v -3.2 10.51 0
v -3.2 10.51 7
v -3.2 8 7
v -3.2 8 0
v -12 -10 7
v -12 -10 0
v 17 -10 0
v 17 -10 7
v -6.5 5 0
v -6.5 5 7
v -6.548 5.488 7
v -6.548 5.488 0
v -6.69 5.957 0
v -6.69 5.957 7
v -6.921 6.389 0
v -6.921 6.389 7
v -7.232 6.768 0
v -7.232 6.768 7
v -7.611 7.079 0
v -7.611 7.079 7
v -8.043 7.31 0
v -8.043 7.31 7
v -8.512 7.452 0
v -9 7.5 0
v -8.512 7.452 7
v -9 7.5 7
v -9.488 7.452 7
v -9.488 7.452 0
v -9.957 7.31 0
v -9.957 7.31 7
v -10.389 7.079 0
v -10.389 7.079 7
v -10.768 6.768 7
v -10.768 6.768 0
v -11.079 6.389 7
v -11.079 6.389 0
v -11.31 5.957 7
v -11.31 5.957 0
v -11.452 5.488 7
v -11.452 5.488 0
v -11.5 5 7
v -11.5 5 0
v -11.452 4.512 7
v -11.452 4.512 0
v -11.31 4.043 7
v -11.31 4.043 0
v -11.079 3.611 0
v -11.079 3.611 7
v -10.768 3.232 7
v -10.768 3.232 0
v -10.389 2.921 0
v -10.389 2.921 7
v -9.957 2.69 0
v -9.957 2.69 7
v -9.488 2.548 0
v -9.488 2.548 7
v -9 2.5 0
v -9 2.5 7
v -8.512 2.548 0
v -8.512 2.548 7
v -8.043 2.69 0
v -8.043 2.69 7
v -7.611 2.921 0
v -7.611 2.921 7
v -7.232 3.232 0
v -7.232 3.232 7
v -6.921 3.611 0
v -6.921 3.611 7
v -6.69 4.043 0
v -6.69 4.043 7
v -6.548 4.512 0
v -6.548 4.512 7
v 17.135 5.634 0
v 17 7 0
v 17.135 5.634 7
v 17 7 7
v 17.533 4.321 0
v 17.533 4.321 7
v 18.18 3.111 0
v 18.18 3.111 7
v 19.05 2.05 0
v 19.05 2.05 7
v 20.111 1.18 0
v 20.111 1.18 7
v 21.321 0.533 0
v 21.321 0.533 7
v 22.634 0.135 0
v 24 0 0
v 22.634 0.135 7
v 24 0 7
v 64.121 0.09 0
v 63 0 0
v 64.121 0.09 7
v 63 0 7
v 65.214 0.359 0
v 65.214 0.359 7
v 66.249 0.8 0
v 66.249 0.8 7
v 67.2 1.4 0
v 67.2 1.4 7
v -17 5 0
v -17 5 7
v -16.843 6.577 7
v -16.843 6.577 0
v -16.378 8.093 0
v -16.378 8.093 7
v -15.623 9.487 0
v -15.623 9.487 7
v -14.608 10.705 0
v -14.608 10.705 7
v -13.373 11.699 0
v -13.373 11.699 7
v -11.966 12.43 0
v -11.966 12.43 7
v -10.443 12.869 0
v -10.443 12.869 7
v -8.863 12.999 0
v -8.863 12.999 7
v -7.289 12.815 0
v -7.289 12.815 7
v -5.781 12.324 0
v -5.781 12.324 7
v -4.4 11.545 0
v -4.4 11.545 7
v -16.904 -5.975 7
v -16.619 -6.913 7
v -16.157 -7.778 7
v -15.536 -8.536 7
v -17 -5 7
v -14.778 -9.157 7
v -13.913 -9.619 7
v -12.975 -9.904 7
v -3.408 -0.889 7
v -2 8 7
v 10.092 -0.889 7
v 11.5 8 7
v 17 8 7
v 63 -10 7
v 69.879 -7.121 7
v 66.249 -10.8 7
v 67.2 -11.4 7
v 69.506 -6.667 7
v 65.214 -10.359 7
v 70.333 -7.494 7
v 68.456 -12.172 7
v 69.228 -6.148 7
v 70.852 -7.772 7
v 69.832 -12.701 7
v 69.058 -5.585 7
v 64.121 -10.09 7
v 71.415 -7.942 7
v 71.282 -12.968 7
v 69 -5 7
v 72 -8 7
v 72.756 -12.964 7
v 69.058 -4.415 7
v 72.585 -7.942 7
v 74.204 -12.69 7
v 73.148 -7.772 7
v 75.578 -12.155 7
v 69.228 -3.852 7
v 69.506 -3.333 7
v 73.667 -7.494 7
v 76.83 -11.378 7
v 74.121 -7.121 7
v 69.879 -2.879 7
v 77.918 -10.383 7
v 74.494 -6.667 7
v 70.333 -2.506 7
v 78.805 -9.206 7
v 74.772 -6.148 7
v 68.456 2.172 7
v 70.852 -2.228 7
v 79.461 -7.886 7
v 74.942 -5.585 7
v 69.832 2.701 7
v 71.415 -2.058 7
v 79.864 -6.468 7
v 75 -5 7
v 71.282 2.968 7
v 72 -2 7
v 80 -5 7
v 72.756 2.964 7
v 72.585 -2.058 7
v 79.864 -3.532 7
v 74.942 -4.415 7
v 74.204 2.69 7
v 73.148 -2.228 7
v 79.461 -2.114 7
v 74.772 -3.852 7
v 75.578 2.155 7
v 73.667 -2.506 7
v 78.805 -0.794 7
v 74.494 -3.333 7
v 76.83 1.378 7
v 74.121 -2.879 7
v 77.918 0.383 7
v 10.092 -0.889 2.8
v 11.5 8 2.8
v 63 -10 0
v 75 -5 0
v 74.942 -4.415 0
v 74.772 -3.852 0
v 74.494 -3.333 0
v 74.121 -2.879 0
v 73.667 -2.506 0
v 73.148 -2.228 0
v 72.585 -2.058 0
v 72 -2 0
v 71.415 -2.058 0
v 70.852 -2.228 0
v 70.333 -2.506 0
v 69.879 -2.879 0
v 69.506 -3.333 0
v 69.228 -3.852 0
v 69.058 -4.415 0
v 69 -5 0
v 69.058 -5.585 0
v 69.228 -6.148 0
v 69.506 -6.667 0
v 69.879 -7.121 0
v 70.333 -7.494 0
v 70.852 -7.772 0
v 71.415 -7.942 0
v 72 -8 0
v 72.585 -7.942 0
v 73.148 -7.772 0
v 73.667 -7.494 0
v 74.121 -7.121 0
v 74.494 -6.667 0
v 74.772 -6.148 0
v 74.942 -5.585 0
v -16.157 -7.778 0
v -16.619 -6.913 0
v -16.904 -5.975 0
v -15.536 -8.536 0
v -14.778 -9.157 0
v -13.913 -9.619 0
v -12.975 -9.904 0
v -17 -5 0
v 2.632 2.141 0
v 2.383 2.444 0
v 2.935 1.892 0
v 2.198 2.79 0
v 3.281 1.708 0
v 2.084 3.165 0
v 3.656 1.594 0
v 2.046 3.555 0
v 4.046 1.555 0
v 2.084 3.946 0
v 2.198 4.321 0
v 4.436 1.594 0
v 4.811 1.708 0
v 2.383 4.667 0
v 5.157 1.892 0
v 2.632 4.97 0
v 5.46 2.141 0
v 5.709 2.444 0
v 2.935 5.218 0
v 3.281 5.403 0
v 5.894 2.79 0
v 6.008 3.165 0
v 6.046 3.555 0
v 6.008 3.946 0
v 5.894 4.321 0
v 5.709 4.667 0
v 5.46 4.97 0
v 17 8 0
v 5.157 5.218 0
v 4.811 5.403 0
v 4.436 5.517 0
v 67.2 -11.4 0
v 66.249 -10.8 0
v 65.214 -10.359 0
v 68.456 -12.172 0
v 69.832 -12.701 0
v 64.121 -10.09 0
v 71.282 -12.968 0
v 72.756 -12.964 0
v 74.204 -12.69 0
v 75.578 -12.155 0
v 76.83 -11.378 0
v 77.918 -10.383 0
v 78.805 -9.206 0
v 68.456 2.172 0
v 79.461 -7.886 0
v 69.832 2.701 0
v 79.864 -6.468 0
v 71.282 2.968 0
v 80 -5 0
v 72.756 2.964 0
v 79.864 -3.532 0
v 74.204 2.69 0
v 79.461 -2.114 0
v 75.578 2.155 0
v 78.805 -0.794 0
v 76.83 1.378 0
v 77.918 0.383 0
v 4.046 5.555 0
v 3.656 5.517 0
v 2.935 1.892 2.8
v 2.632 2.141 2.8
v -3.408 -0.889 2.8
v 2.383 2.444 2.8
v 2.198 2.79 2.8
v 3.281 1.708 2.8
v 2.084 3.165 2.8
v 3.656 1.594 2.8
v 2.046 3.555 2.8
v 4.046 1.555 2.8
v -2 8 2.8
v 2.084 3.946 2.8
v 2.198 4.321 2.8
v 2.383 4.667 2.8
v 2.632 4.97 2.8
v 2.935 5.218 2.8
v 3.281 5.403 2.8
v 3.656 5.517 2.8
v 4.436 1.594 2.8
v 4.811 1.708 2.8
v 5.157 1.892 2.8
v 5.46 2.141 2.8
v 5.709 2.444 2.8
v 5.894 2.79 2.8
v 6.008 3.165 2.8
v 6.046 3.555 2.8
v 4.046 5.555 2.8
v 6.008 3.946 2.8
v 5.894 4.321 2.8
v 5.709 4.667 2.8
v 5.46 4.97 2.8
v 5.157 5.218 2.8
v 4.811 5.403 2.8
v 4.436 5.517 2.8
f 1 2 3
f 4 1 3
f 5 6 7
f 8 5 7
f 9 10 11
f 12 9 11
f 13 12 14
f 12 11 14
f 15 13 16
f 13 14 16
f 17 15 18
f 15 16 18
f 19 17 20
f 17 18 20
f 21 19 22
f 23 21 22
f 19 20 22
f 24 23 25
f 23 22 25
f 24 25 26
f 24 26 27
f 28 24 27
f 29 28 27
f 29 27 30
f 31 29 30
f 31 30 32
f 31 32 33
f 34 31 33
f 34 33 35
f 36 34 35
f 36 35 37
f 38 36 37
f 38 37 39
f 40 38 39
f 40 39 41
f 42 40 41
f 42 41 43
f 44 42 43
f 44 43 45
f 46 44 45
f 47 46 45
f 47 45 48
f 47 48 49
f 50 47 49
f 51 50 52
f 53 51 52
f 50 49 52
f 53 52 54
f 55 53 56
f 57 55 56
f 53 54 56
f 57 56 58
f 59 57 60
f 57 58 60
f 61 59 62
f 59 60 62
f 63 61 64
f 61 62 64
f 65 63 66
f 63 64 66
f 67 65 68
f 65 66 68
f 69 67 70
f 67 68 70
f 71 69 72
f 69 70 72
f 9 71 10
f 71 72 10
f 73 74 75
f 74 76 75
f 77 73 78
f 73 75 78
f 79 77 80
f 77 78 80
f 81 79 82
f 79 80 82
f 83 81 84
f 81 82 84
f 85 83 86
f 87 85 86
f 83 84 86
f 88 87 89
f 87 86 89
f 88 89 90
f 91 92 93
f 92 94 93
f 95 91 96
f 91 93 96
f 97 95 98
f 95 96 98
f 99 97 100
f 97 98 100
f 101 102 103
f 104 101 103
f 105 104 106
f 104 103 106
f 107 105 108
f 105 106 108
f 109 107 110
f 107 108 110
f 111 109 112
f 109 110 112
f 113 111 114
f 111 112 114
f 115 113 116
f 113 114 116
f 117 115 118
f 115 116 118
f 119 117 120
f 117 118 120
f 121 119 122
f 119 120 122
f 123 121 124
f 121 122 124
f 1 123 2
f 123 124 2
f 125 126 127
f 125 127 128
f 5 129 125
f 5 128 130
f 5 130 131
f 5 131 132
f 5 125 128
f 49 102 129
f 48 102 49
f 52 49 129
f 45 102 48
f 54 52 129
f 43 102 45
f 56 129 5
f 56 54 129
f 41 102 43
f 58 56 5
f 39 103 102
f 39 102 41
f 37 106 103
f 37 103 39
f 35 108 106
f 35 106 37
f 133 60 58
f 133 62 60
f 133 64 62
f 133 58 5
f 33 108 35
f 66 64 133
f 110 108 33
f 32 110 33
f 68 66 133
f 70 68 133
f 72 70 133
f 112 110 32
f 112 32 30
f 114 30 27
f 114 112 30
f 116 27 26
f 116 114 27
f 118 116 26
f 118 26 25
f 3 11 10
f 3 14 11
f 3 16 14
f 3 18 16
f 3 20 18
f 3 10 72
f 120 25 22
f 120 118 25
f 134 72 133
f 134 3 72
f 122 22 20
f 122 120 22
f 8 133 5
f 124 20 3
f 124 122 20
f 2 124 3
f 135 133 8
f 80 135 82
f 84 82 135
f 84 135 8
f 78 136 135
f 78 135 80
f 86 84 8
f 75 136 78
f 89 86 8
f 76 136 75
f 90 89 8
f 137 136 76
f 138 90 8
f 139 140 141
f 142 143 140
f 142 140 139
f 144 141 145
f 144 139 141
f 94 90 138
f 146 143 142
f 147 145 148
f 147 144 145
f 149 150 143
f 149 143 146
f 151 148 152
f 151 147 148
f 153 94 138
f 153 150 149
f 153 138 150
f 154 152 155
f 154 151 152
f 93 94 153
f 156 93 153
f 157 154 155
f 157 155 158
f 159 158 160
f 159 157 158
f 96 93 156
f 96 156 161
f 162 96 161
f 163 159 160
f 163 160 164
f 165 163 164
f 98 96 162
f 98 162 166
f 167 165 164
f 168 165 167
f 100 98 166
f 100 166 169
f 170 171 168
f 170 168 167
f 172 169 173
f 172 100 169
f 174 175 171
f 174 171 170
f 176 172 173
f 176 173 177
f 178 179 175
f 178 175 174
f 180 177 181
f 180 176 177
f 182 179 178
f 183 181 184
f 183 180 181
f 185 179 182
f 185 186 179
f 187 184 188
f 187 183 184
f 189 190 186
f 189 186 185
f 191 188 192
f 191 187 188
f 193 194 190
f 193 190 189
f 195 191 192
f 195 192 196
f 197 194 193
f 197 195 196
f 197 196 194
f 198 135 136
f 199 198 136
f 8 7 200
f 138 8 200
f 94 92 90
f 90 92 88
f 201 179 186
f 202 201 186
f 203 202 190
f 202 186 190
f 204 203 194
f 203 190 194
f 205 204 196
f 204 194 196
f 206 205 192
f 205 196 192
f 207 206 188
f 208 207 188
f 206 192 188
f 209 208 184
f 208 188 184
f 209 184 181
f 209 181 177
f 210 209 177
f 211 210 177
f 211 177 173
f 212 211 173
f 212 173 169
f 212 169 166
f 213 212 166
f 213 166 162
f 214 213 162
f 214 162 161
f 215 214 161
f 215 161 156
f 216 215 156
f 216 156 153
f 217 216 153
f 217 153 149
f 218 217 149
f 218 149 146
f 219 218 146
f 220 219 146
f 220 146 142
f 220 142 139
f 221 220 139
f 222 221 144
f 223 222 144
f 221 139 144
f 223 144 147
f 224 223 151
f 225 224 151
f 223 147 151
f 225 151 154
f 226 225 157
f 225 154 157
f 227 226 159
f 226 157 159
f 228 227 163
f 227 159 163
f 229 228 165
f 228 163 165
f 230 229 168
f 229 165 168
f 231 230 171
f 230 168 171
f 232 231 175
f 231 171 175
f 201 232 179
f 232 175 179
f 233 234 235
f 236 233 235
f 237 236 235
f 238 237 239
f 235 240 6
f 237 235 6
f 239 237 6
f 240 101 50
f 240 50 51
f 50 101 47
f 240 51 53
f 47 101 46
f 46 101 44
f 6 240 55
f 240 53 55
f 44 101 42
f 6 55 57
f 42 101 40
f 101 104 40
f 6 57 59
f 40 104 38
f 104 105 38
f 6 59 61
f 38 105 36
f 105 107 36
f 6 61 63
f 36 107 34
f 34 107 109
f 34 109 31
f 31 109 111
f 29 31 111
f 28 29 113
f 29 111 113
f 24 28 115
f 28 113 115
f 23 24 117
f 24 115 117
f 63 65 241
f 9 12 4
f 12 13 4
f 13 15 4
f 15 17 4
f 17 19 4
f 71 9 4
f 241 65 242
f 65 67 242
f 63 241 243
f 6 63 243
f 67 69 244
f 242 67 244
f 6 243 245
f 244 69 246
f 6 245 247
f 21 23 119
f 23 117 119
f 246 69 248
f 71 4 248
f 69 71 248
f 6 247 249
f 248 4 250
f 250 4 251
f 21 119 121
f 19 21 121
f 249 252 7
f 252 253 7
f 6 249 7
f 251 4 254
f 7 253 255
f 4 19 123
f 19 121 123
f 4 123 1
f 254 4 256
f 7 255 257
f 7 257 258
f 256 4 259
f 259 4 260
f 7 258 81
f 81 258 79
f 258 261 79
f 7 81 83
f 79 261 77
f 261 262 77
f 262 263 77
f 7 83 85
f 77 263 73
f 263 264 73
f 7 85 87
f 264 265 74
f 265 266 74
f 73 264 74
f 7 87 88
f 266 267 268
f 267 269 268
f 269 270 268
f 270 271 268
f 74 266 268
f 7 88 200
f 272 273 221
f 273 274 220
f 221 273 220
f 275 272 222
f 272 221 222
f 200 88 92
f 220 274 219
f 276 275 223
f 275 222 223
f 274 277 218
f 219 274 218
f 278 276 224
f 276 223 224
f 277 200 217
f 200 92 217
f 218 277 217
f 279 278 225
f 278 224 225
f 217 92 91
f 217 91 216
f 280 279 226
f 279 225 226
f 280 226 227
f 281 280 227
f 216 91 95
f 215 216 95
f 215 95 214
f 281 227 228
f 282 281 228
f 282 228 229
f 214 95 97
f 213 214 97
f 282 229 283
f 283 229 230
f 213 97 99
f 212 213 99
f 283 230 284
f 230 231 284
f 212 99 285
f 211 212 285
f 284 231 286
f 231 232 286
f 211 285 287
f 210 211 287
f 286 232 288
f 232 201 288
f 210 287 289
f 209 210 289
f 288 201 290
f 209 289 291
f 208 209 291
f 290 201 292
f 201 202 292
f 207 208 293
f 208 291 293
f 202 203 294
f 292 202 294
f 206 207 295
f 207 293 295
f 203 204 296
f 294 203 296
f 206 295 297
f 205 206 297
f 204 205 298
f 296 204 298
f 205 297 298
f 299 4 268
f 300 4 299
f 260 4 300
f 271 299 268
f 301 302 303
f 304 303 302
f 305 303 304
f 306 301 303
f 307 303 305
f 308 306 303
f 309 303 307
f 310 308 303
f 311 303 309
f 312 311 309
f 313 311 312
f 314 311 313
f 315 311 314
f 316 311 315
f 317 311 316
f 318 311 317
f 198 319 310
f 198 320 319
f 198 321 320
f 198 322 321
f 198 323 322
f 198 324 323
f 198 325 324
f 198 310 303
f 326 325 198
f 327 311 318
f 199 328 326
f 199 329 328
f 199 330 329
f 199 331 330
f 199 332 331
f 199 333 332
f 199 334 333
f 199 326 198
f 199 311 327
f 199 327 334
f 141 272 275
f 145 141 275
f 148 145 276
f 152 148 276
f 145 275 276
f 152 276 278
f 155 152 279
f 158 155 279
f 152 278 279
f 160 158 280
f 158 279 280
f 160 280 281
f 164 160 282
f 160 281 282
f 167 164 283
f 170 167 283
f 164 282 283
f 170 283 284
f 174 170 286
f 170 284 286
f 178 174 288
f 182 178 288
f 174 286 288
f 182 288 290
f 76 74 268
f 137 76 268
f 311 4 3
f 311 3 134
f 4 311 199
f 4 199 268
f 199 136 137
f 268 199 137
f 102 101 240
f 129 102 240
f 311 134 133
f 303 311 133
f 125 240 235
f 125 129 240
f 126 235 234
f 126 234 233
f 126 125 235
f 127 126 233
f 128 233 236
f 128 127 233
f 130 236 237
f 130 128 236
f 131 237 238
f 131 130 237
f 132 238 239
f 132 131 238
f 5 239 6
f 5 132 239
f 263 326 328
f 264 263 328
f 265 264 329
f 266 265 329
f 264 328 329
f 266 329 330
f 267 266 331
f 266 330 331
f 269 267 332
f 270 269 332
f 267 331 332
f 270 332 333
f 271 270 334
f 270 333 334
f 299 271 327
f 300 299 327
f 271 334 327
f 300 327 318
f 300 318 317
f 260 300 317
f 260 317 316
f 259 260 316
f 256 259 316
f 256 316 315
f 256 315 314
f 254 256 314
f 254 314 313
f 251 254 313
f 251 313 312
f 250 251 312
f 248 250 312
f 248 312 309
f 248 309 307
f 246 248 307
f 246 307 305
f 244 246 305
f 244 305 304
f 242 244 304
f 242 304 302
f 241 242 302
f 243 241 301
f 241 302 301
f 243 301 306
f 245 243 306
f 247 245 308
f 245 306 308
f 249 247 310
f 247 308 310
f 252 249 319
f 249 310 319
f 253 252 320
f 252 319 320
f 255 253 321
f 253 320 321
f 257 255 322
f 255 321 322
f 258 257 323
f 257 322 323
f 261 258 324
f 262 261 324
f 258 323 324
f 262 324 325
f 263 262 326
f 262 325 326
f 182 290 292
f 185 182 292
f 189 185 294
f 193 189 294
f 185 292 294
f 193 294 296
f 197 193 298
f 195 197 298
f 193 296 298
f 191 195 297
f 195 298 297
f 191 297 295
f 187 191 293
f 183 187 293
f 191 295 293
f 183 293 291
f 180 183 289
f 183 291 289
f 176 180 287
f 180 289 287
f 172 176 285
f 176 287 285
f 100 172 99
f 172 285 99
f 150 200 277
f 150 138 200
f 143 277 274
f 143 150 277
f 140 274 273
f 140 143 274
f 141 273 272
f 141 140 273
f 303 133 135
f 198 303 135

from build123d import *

# Parameters (mm, degrees)
F1_DEPTH    = 7
F2_R        = 2
F3_DEPTH    = 4.2
F4_DEPTH    = 25
F5_R        = 2.5
F6_DEPTH    = 25
F7_R        = 8
F8_R        = 5
F9_T1_DEPTH = 52
F11_DEPTH   = 25
F13_DEPTH   = 25
F14_R       = 3
F15_DEPTH   = 25
F16_R       = 7


# Not quite as in the source:
# - a fillet or chamfer that OpenCascade refuses, or shapes differently, is made with other operations: its cross-section is extruded or revolved along the edge and cut away or added
# - ends of sketch curves that miss each other by under 0.0002 mm in the source are joined
# - a feature names something its author has since deleted; it is built from what else it names


with BuildPart() as f1:
    # F0 (on Top) → F1 (new body)
    with BuildSketch(Plane.XY):
        Polygon((-2, 17), (-17.0000004771, 17), (-16.9999997194, -10.0000004771), (17.0000002806, -9.9999995229), (17, 4.771e-07), (16.9999997755, 8), (-2, 8), align=None)
        with BuildLine():
            Line((17, 4.771e-07), (17.0000002806, -9.9999995229))
            Line((17.0000002806, -9.9999995229), (65.7550022822, -9.9999995229))
            ThreePointArc((65.7550022822, -9.9999995229), (64.0000002806, -4.9999995229), (65.7550022822, 4.771e-07))
            Line((65.7550022822, 4.771e-07), (17, 4.771e-07))
        make_face()
        with BuildLine():
            ThreePointArc((65.7550022822, 4.771e-07), (64.0000002806, -4.9999995229), (65.7550022822, -9.9999995229))
            Line((65.7550022822, -9.9999995229), (72.0000002806, -9.9999995229))
            Line((72.0000002806, -9.9999995229), (72.0000002806, 4.771e-07))
            Line((72.0000002806, 4.771e-07), (65.7550022822, 4.771e-07))
        make_face()
        with BuildLine():
            Line((72.0000002806, -9.9999995229), (65.7550022822, -9.9999995229))
            ThreePointArc((65.7550022822, -9.9999995229), (74.6495300514, -12.5485087793), (80.0000002806, -4.9999995229))
            ThreePointArc((80.0000002806, -4.9999995229), (74.6495300514, 2.5485097334), (65.7550022822, 4.771e-07))
            Line((65.7550022822, 4.771e-07), (72.0000002806, 4.771e-07))
            Line((72.0000002806, 4.771e-07), (72.0000002806, -9.9999995229))
        make_face()
    extrude(amount=F1_DEPTH)

    # F2 (on face) → F3 (cut)
    with BuildSketch(Plane.XY.offset(7)):
        Polygon((11.5, 8), (-2, 8), (-3.4079101854, -0.8891950654), (10.0920898146, -0.8891950654), align=None)
        with Locations((4.0460449073, 3.5554024673)):
            Circle(F2_R, mode=Mode.SUBTRACT)
    extrude(amount=-F3_DEPTH, mode=Mode.SUBTRACT)

    # F4 (cut): a face of the model
    f4_faces = [f1.faces().sort_by_distance(p)[0] for p in [
        (4.0460449073, 3.5554024673, 7),
    ]]
    extrude(f4_faces, amount=-F4_DEPTH, mode=Mode.SUBTRACT)

    # F5 (on face) → F6 (cut)
    with BuildSketch(Plane.XY.offset(7)):
        with Locations((-9, 5)):
            Circle(F5_R)
    extrude(amount=-F6_DEPTH, mode=Mode.SUBTRACT)

    # F7
    f7_edges = [f1.edges().sort_by_distance(p)[0] for p in [
        (-17, 17, 3.5),
    ]]
    fillet(f7_edges, radius=F7_R)

    # F8
    f8_edges = [f1.edges().sort_by_distance(p)[0] for p in [
        (-17, -10, 3.5),
    ]]
    fillet(f8_edges, radius=F8_R)

    # F9: fillet of radius 9 on 1 edges, made by hand

    # F9_s2 → F9_t1 (cut)
    with BuildSketch(Plane.XY.offset(-22.5)):
        with BuildLine():
            ThreePointArc((-11, 17), (-4.6360389693, 14.3639610307), (-2, 8))
            Line((-2, 8), (-2, 17))
            Line((-2, 17), (-11, 17))
        make_face()
    extrude(amount=F9_T1_DEPTH, mode=Mode.SUBTRACT)

    # F10 (on face) → F11 (cut)
    with BuildSketch(Plane.XY.offset(7)):
        with BuildLine():
            ThreePointArc((-3.2, 12.4899888642), (-2.3051739523, 10.3237900078), (-2, 8))
            Line((-2, 8), (-2, 18))
            Line((-2, 18), (-3.2, 18))
            Line((-3.2, 18), (-3.2, 12.4899888642))
        make_face()
        with BuildLine():
            Line((-3.2, 8), (-2, 8))
            ThreePointArc((-2, 8), (-2.3051739523, 10.3237900078), (-3.2, 12.4899888642))
            Line((-3.2, 12.4899888642), (-3.2, 8))
        make_face()
    extrude(amount=-F11_DEPTH, mode=Mode.SUBTRACT)

    # F12 (on face) → F13 (cut)
    with BuildSketch(Plane.XY.offset(7)):
        with BuildLine():
            ThreePointArc((-17, 4.9999997208), (-11.9664795245, 12.4296701966), (-3.2, 10.5099909256))
            Line((-3.2, 10.5099909256), (-3.2, 12.4899888642))
            ThreePointArc((-3.2, 12.4899888642), (-6.0560248177, 15.5204460903), (-9.9704600393, 16.9409198335))
            ThreePointArc((-9.9704600393, 16.9409198335), (-14.9901454961, 14.3026559347), (-17.0000002526, 8.9999997755))
            Line((-17.0000002526, 8.9999997755), (-17, 4.9999997208))
        make_face()
    extrude(amount=-F13_DEPTH, mode=Mode.SUBTRACT)

    # F14 (on face) → F15 (cut)
    with BuildSketch(Plane.XY.offset(7)):
        with Locations((72.0000002806, -4.9999995229)):
            Circle(F14_R)
    extrude(amount=-F15_DEPTH, mode=Mode.SUBTRACT)

    # F16
    f16_edges = [f1.edges().sort_by_distance(p)[0] for p in [
        (17, 0, 3.5),
        (65.755002, -10, 3.5),
        (65.755002, 0, 3.5),
    ]]
    fillet(f16_edges, radius=F16_R)


solid = f1.part
